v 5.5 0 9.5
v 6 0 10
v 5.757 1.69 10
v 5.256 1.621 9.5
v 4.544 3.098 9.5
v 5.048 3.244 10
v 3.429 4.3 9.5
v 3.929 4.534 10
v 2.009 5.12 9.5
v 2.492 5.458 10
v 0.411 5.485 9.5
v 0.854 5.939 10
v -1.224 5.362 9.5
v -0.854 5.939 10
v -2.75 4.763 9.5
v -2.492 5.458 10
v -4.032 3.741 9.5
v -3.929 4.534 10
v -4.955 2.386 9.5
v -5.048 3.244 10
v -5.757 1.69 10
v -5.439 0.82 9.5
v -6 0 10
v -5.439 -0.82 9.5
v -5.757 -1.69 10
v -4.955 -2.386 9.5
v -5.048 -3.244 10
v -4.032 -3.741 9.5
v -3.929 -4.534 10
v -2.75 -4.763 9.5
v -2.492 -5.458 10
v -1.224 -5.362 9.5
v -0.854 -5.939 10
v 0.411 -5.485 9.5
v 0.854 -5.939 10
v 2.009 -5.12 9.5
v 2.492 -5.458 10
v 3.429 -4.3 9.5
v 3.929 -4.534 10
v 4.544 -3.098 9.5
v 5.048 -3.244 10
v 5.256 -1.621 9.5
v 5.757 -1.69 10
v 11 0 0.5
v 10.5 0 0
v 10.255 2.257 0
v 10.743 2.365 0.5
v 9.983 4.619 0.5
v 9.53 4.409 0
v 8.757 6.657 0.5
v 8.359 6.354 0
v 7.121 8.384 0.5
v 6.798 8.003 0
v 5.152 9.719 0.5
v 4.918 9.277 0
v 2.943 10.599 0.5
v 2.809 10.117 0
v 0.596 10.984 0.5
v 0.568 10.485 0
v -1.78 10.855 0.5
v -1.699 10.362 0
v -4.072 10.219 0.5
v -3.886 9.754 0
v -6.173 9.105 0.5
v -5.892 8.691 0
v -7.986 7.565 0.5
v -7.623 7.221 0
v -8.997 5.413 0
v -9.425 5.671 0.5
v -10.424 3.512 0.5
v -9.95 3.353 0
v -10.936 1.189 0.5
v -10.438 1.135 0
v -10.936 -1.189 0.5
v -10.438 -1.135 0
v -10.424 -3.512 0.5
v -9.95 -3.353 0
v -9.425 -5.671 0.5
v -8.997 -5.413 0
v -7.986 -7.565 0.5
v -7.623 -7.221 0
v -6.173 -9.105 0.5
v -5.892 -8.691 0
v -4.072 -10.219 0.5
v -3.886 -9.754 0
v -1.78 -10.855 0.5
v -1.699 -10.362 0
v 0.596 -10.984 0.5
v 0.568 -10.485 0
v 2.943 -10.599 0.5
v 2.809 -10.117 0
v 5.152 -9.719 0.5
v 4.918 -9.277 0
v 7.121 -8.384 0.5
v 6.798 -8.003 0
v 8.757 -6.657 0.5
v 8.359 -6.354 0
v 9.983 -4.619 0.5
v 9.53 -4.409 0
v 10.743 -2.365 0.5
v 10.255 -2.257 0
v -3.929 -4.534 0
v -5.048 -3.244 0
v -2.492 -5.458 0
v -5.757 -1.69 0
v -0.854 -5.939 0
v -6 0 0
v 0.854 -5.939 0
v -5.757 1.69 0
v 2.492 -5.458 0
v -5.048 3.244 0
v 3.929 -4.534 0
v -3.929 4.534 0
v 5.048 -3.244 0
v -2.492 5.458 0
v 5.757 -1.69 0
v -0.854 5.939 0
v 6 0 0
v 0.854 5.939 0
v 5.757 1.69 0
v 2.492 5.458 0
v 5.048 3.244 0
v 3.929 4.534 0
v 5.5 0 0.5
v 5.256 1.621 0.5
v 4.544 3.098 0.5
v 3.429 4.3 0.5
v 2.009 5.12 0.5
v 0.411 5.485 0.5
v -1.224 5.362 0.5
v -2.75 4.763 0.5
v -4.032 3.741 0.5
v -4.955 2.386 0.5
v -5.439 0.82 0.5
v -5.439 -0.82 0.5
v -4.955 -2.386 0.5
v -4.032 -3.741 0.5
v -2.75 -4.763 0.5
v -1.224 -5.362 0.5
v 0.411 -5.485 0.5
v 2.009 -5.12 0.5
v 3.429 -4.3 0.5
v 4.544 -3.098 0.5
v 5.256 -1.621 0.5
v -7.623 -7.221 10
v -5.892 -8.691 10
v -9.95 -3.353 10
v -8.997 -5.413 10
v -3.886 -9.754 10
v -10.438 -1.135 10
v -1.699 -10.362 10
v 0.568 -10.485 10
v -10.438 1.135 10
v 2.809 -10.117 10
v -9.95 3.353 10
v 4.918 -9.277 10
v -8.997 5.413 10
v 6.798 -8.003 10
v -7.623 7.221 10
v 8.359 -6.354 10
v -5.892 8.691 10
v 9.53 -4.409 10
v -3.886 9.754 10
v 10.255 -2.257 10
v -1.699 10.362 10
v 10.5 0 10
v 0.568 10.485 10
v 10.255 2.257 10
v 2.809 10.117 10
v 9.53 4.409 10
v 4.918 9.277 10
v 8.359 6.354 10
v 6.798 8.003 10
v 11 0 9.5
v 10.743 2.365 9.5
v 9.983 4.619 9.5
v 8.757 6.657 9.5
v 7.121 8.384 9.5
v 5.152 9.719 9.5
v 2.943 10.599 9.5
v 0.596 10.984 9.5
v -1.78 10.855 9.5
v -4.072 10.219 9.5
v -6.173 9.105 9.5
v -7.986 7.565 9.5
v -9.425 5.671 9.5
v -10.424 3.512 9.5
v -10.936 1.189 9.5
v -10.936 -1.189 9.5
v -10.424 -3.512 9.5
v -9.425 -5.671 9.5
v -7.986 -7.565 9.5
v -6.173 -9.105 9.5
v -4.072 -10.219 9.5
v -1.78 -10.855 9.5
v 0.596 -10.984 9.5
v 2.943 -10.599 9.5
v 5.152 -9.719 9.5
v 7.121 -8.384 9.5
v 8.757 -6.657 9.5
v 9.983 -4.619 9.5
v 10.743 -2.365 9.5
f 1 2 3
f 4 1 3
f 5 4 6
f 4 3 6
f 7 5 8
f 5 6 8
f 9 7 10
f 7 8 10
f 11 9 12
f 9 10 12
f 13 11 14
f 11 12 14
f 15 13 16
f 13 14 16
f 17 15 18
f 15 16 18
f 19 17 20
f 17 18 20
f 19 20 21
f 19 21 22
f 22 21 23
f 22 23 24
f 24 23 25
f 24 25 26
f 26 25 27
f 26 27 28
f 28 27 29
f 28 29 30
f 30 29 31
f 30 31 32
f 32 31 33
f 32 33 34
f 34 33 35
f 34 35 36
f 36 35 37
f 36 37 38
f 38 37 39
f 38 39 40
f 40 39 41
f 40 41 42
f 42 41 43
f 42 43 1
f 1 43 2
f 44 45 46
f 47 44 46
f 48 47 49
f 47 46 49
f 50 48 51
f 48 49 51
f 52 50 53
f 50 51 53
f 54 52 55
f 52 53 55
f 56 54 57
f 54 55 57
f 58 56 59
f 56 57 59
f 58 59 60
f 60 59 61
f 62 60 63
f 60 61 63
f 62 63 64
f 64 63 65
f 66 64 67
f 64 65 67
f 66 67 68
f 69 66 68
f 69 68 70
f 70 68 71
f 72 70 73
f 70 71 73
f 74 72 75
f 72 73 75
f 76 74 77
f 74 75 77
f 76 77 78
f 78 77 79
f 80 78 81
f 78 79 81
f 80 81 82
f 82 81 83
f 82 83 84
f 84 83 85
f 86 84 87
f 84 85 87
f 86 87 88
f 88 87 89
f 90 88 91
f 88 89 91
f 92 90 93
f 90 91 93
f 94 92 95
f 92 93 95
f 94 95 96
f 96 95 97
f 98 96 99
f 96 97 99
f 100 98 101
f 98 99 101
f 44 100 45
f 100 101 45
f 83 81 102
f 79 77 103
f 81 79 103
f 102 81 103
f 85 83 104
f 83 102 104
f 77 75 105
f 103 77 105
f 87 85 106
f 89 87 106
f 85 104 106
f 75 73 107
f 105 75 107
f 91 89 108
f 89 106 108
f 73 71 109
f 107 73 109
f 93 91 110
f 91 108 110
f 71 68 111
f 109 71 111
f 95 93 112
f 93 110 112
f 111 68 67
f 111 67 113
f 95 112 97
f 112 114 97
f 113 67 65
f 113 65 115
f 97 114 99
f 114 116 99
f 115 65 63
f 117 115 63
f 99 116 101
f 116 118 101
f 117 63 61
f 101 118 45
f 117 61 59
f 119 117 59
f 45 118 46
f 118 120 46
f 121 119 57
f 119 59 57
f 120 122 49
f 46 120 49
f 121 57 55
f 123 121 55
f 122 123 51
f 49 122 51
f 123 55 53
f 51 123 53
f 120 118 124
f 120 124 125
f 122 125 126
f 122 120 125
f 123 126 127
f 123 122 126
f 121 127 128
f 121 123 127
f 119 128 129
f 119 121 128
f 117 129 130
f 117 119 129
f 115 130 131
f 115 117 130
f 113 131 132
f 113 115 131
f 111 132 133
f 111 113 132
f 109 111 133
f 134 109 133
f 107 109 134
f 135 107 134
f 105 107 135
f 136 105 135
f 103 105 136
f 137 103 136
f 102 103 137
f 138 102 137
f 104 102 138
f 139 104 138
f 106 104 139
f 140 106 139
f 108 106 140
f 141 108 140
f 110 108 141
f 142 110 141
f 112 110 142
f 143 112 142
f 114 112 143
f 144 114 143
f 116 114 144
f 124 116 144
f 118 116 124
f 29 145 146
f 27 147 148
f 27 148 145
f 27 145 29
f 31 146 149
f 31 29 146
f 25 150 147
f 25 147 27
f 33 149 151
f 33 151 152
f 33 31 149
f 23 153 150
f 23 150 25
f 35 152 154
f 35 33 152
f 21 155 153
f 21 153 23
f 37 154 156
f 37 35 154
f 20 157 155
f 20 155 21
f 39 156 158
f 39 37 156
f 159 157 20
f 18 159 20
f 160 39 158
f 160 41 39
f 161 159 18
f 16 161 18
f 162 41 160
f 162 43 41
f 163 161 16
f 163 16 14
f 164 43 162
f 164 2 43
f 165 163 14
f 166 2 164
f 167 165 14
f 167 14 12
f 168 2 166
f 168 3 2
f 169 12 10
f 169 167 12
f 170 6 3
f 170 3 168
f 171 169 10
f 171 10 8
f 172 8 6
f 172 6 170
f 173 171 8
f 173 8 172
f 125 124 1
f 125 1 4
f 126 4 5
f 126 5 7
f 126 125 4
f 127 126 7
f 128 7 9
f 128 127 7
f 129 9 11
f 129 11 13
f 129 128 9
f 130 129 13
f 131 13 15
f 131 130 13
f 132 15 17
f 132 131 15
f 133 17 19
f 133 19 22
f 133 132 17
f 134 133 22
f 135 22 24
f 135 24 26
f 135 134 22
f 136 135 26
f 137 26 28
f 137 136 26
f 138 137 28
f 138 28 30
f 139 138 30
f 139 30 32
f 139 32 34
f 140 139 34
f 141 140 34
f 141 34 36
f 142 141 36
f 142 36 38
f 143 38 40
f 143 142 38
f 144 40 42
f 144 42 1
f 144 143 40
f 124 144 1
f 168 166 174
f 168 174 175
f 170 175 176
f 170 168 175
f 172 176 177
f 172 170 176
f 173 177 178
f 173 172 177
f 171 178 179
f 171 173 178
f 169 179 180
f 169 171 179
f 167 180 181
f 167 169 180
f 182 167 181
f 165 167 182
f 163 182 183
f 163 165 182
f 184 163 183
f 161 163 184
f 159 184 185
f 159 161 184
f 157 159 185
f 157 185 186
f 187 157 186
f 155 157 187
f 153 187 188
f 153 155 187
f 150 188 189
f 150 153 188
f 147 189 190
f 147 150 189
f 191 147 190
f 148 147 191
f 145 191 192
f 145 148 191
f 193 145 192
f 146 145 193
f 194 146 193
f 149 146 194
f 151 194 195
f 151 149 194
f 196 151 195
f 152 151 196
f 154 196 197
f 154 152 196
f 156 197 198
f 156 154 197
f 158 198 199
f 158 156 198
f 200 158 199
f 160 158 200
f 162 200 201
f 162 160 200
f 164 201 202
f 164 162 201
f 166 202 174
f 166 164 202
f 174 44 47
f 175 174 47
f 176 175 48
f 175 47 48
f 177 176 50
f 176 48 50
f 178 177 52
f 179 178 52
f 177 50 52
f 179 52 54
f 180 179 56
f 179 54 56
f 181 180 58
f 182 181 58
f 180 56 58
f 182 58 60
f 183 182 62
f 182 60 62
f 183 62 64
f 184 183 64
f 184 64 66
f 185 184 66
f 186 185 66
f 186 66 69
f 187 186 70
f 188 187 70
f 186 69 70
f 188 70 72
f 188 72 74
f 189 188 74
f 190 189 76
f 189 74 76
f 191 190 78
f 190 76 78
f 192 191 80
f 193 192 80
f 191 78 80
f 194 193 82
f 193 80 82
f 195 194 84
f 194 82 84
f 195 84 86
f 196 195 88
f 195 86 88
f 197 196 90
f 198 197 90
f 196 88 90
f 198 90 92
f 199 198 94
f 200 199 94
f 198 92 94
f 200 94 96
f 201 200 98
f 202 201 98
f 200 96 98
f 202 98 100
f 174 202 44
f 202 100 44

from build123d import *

# Parameters (mm, degrees)
SKICA1_R                = 11
SKICA1_R_2              = 5.5
P_IDAT_VYSUNUT_M1_DEPTH = 10
ZKOSEN_1_SIZE           = 0.5


with BuildPart() as part:
    # Skica1 → Přidat vysunutím1 (new body)
    with BuildSketch(Plane.XY):
        Circle(SKICA1_R)
        Circle(SKICA1_R_2, mode=Mode.SUBTRACT)
    extrude(amount=P_IDAT_VYSUNUT_M1_DEPTH)

    # Zkosení1
    zkosen_1_edges = [part.edges().sort_by_distance(p)[0] for p in [
        (-11, 0, 0),
        (-11, 0, 10),
        (-5.5, 0, 0),
        (-5.5, 0, 10),
    ]]
    chamfer(zkosen_1_edges, length=ZKOSEN_1_SIZE)


solid = part.part
